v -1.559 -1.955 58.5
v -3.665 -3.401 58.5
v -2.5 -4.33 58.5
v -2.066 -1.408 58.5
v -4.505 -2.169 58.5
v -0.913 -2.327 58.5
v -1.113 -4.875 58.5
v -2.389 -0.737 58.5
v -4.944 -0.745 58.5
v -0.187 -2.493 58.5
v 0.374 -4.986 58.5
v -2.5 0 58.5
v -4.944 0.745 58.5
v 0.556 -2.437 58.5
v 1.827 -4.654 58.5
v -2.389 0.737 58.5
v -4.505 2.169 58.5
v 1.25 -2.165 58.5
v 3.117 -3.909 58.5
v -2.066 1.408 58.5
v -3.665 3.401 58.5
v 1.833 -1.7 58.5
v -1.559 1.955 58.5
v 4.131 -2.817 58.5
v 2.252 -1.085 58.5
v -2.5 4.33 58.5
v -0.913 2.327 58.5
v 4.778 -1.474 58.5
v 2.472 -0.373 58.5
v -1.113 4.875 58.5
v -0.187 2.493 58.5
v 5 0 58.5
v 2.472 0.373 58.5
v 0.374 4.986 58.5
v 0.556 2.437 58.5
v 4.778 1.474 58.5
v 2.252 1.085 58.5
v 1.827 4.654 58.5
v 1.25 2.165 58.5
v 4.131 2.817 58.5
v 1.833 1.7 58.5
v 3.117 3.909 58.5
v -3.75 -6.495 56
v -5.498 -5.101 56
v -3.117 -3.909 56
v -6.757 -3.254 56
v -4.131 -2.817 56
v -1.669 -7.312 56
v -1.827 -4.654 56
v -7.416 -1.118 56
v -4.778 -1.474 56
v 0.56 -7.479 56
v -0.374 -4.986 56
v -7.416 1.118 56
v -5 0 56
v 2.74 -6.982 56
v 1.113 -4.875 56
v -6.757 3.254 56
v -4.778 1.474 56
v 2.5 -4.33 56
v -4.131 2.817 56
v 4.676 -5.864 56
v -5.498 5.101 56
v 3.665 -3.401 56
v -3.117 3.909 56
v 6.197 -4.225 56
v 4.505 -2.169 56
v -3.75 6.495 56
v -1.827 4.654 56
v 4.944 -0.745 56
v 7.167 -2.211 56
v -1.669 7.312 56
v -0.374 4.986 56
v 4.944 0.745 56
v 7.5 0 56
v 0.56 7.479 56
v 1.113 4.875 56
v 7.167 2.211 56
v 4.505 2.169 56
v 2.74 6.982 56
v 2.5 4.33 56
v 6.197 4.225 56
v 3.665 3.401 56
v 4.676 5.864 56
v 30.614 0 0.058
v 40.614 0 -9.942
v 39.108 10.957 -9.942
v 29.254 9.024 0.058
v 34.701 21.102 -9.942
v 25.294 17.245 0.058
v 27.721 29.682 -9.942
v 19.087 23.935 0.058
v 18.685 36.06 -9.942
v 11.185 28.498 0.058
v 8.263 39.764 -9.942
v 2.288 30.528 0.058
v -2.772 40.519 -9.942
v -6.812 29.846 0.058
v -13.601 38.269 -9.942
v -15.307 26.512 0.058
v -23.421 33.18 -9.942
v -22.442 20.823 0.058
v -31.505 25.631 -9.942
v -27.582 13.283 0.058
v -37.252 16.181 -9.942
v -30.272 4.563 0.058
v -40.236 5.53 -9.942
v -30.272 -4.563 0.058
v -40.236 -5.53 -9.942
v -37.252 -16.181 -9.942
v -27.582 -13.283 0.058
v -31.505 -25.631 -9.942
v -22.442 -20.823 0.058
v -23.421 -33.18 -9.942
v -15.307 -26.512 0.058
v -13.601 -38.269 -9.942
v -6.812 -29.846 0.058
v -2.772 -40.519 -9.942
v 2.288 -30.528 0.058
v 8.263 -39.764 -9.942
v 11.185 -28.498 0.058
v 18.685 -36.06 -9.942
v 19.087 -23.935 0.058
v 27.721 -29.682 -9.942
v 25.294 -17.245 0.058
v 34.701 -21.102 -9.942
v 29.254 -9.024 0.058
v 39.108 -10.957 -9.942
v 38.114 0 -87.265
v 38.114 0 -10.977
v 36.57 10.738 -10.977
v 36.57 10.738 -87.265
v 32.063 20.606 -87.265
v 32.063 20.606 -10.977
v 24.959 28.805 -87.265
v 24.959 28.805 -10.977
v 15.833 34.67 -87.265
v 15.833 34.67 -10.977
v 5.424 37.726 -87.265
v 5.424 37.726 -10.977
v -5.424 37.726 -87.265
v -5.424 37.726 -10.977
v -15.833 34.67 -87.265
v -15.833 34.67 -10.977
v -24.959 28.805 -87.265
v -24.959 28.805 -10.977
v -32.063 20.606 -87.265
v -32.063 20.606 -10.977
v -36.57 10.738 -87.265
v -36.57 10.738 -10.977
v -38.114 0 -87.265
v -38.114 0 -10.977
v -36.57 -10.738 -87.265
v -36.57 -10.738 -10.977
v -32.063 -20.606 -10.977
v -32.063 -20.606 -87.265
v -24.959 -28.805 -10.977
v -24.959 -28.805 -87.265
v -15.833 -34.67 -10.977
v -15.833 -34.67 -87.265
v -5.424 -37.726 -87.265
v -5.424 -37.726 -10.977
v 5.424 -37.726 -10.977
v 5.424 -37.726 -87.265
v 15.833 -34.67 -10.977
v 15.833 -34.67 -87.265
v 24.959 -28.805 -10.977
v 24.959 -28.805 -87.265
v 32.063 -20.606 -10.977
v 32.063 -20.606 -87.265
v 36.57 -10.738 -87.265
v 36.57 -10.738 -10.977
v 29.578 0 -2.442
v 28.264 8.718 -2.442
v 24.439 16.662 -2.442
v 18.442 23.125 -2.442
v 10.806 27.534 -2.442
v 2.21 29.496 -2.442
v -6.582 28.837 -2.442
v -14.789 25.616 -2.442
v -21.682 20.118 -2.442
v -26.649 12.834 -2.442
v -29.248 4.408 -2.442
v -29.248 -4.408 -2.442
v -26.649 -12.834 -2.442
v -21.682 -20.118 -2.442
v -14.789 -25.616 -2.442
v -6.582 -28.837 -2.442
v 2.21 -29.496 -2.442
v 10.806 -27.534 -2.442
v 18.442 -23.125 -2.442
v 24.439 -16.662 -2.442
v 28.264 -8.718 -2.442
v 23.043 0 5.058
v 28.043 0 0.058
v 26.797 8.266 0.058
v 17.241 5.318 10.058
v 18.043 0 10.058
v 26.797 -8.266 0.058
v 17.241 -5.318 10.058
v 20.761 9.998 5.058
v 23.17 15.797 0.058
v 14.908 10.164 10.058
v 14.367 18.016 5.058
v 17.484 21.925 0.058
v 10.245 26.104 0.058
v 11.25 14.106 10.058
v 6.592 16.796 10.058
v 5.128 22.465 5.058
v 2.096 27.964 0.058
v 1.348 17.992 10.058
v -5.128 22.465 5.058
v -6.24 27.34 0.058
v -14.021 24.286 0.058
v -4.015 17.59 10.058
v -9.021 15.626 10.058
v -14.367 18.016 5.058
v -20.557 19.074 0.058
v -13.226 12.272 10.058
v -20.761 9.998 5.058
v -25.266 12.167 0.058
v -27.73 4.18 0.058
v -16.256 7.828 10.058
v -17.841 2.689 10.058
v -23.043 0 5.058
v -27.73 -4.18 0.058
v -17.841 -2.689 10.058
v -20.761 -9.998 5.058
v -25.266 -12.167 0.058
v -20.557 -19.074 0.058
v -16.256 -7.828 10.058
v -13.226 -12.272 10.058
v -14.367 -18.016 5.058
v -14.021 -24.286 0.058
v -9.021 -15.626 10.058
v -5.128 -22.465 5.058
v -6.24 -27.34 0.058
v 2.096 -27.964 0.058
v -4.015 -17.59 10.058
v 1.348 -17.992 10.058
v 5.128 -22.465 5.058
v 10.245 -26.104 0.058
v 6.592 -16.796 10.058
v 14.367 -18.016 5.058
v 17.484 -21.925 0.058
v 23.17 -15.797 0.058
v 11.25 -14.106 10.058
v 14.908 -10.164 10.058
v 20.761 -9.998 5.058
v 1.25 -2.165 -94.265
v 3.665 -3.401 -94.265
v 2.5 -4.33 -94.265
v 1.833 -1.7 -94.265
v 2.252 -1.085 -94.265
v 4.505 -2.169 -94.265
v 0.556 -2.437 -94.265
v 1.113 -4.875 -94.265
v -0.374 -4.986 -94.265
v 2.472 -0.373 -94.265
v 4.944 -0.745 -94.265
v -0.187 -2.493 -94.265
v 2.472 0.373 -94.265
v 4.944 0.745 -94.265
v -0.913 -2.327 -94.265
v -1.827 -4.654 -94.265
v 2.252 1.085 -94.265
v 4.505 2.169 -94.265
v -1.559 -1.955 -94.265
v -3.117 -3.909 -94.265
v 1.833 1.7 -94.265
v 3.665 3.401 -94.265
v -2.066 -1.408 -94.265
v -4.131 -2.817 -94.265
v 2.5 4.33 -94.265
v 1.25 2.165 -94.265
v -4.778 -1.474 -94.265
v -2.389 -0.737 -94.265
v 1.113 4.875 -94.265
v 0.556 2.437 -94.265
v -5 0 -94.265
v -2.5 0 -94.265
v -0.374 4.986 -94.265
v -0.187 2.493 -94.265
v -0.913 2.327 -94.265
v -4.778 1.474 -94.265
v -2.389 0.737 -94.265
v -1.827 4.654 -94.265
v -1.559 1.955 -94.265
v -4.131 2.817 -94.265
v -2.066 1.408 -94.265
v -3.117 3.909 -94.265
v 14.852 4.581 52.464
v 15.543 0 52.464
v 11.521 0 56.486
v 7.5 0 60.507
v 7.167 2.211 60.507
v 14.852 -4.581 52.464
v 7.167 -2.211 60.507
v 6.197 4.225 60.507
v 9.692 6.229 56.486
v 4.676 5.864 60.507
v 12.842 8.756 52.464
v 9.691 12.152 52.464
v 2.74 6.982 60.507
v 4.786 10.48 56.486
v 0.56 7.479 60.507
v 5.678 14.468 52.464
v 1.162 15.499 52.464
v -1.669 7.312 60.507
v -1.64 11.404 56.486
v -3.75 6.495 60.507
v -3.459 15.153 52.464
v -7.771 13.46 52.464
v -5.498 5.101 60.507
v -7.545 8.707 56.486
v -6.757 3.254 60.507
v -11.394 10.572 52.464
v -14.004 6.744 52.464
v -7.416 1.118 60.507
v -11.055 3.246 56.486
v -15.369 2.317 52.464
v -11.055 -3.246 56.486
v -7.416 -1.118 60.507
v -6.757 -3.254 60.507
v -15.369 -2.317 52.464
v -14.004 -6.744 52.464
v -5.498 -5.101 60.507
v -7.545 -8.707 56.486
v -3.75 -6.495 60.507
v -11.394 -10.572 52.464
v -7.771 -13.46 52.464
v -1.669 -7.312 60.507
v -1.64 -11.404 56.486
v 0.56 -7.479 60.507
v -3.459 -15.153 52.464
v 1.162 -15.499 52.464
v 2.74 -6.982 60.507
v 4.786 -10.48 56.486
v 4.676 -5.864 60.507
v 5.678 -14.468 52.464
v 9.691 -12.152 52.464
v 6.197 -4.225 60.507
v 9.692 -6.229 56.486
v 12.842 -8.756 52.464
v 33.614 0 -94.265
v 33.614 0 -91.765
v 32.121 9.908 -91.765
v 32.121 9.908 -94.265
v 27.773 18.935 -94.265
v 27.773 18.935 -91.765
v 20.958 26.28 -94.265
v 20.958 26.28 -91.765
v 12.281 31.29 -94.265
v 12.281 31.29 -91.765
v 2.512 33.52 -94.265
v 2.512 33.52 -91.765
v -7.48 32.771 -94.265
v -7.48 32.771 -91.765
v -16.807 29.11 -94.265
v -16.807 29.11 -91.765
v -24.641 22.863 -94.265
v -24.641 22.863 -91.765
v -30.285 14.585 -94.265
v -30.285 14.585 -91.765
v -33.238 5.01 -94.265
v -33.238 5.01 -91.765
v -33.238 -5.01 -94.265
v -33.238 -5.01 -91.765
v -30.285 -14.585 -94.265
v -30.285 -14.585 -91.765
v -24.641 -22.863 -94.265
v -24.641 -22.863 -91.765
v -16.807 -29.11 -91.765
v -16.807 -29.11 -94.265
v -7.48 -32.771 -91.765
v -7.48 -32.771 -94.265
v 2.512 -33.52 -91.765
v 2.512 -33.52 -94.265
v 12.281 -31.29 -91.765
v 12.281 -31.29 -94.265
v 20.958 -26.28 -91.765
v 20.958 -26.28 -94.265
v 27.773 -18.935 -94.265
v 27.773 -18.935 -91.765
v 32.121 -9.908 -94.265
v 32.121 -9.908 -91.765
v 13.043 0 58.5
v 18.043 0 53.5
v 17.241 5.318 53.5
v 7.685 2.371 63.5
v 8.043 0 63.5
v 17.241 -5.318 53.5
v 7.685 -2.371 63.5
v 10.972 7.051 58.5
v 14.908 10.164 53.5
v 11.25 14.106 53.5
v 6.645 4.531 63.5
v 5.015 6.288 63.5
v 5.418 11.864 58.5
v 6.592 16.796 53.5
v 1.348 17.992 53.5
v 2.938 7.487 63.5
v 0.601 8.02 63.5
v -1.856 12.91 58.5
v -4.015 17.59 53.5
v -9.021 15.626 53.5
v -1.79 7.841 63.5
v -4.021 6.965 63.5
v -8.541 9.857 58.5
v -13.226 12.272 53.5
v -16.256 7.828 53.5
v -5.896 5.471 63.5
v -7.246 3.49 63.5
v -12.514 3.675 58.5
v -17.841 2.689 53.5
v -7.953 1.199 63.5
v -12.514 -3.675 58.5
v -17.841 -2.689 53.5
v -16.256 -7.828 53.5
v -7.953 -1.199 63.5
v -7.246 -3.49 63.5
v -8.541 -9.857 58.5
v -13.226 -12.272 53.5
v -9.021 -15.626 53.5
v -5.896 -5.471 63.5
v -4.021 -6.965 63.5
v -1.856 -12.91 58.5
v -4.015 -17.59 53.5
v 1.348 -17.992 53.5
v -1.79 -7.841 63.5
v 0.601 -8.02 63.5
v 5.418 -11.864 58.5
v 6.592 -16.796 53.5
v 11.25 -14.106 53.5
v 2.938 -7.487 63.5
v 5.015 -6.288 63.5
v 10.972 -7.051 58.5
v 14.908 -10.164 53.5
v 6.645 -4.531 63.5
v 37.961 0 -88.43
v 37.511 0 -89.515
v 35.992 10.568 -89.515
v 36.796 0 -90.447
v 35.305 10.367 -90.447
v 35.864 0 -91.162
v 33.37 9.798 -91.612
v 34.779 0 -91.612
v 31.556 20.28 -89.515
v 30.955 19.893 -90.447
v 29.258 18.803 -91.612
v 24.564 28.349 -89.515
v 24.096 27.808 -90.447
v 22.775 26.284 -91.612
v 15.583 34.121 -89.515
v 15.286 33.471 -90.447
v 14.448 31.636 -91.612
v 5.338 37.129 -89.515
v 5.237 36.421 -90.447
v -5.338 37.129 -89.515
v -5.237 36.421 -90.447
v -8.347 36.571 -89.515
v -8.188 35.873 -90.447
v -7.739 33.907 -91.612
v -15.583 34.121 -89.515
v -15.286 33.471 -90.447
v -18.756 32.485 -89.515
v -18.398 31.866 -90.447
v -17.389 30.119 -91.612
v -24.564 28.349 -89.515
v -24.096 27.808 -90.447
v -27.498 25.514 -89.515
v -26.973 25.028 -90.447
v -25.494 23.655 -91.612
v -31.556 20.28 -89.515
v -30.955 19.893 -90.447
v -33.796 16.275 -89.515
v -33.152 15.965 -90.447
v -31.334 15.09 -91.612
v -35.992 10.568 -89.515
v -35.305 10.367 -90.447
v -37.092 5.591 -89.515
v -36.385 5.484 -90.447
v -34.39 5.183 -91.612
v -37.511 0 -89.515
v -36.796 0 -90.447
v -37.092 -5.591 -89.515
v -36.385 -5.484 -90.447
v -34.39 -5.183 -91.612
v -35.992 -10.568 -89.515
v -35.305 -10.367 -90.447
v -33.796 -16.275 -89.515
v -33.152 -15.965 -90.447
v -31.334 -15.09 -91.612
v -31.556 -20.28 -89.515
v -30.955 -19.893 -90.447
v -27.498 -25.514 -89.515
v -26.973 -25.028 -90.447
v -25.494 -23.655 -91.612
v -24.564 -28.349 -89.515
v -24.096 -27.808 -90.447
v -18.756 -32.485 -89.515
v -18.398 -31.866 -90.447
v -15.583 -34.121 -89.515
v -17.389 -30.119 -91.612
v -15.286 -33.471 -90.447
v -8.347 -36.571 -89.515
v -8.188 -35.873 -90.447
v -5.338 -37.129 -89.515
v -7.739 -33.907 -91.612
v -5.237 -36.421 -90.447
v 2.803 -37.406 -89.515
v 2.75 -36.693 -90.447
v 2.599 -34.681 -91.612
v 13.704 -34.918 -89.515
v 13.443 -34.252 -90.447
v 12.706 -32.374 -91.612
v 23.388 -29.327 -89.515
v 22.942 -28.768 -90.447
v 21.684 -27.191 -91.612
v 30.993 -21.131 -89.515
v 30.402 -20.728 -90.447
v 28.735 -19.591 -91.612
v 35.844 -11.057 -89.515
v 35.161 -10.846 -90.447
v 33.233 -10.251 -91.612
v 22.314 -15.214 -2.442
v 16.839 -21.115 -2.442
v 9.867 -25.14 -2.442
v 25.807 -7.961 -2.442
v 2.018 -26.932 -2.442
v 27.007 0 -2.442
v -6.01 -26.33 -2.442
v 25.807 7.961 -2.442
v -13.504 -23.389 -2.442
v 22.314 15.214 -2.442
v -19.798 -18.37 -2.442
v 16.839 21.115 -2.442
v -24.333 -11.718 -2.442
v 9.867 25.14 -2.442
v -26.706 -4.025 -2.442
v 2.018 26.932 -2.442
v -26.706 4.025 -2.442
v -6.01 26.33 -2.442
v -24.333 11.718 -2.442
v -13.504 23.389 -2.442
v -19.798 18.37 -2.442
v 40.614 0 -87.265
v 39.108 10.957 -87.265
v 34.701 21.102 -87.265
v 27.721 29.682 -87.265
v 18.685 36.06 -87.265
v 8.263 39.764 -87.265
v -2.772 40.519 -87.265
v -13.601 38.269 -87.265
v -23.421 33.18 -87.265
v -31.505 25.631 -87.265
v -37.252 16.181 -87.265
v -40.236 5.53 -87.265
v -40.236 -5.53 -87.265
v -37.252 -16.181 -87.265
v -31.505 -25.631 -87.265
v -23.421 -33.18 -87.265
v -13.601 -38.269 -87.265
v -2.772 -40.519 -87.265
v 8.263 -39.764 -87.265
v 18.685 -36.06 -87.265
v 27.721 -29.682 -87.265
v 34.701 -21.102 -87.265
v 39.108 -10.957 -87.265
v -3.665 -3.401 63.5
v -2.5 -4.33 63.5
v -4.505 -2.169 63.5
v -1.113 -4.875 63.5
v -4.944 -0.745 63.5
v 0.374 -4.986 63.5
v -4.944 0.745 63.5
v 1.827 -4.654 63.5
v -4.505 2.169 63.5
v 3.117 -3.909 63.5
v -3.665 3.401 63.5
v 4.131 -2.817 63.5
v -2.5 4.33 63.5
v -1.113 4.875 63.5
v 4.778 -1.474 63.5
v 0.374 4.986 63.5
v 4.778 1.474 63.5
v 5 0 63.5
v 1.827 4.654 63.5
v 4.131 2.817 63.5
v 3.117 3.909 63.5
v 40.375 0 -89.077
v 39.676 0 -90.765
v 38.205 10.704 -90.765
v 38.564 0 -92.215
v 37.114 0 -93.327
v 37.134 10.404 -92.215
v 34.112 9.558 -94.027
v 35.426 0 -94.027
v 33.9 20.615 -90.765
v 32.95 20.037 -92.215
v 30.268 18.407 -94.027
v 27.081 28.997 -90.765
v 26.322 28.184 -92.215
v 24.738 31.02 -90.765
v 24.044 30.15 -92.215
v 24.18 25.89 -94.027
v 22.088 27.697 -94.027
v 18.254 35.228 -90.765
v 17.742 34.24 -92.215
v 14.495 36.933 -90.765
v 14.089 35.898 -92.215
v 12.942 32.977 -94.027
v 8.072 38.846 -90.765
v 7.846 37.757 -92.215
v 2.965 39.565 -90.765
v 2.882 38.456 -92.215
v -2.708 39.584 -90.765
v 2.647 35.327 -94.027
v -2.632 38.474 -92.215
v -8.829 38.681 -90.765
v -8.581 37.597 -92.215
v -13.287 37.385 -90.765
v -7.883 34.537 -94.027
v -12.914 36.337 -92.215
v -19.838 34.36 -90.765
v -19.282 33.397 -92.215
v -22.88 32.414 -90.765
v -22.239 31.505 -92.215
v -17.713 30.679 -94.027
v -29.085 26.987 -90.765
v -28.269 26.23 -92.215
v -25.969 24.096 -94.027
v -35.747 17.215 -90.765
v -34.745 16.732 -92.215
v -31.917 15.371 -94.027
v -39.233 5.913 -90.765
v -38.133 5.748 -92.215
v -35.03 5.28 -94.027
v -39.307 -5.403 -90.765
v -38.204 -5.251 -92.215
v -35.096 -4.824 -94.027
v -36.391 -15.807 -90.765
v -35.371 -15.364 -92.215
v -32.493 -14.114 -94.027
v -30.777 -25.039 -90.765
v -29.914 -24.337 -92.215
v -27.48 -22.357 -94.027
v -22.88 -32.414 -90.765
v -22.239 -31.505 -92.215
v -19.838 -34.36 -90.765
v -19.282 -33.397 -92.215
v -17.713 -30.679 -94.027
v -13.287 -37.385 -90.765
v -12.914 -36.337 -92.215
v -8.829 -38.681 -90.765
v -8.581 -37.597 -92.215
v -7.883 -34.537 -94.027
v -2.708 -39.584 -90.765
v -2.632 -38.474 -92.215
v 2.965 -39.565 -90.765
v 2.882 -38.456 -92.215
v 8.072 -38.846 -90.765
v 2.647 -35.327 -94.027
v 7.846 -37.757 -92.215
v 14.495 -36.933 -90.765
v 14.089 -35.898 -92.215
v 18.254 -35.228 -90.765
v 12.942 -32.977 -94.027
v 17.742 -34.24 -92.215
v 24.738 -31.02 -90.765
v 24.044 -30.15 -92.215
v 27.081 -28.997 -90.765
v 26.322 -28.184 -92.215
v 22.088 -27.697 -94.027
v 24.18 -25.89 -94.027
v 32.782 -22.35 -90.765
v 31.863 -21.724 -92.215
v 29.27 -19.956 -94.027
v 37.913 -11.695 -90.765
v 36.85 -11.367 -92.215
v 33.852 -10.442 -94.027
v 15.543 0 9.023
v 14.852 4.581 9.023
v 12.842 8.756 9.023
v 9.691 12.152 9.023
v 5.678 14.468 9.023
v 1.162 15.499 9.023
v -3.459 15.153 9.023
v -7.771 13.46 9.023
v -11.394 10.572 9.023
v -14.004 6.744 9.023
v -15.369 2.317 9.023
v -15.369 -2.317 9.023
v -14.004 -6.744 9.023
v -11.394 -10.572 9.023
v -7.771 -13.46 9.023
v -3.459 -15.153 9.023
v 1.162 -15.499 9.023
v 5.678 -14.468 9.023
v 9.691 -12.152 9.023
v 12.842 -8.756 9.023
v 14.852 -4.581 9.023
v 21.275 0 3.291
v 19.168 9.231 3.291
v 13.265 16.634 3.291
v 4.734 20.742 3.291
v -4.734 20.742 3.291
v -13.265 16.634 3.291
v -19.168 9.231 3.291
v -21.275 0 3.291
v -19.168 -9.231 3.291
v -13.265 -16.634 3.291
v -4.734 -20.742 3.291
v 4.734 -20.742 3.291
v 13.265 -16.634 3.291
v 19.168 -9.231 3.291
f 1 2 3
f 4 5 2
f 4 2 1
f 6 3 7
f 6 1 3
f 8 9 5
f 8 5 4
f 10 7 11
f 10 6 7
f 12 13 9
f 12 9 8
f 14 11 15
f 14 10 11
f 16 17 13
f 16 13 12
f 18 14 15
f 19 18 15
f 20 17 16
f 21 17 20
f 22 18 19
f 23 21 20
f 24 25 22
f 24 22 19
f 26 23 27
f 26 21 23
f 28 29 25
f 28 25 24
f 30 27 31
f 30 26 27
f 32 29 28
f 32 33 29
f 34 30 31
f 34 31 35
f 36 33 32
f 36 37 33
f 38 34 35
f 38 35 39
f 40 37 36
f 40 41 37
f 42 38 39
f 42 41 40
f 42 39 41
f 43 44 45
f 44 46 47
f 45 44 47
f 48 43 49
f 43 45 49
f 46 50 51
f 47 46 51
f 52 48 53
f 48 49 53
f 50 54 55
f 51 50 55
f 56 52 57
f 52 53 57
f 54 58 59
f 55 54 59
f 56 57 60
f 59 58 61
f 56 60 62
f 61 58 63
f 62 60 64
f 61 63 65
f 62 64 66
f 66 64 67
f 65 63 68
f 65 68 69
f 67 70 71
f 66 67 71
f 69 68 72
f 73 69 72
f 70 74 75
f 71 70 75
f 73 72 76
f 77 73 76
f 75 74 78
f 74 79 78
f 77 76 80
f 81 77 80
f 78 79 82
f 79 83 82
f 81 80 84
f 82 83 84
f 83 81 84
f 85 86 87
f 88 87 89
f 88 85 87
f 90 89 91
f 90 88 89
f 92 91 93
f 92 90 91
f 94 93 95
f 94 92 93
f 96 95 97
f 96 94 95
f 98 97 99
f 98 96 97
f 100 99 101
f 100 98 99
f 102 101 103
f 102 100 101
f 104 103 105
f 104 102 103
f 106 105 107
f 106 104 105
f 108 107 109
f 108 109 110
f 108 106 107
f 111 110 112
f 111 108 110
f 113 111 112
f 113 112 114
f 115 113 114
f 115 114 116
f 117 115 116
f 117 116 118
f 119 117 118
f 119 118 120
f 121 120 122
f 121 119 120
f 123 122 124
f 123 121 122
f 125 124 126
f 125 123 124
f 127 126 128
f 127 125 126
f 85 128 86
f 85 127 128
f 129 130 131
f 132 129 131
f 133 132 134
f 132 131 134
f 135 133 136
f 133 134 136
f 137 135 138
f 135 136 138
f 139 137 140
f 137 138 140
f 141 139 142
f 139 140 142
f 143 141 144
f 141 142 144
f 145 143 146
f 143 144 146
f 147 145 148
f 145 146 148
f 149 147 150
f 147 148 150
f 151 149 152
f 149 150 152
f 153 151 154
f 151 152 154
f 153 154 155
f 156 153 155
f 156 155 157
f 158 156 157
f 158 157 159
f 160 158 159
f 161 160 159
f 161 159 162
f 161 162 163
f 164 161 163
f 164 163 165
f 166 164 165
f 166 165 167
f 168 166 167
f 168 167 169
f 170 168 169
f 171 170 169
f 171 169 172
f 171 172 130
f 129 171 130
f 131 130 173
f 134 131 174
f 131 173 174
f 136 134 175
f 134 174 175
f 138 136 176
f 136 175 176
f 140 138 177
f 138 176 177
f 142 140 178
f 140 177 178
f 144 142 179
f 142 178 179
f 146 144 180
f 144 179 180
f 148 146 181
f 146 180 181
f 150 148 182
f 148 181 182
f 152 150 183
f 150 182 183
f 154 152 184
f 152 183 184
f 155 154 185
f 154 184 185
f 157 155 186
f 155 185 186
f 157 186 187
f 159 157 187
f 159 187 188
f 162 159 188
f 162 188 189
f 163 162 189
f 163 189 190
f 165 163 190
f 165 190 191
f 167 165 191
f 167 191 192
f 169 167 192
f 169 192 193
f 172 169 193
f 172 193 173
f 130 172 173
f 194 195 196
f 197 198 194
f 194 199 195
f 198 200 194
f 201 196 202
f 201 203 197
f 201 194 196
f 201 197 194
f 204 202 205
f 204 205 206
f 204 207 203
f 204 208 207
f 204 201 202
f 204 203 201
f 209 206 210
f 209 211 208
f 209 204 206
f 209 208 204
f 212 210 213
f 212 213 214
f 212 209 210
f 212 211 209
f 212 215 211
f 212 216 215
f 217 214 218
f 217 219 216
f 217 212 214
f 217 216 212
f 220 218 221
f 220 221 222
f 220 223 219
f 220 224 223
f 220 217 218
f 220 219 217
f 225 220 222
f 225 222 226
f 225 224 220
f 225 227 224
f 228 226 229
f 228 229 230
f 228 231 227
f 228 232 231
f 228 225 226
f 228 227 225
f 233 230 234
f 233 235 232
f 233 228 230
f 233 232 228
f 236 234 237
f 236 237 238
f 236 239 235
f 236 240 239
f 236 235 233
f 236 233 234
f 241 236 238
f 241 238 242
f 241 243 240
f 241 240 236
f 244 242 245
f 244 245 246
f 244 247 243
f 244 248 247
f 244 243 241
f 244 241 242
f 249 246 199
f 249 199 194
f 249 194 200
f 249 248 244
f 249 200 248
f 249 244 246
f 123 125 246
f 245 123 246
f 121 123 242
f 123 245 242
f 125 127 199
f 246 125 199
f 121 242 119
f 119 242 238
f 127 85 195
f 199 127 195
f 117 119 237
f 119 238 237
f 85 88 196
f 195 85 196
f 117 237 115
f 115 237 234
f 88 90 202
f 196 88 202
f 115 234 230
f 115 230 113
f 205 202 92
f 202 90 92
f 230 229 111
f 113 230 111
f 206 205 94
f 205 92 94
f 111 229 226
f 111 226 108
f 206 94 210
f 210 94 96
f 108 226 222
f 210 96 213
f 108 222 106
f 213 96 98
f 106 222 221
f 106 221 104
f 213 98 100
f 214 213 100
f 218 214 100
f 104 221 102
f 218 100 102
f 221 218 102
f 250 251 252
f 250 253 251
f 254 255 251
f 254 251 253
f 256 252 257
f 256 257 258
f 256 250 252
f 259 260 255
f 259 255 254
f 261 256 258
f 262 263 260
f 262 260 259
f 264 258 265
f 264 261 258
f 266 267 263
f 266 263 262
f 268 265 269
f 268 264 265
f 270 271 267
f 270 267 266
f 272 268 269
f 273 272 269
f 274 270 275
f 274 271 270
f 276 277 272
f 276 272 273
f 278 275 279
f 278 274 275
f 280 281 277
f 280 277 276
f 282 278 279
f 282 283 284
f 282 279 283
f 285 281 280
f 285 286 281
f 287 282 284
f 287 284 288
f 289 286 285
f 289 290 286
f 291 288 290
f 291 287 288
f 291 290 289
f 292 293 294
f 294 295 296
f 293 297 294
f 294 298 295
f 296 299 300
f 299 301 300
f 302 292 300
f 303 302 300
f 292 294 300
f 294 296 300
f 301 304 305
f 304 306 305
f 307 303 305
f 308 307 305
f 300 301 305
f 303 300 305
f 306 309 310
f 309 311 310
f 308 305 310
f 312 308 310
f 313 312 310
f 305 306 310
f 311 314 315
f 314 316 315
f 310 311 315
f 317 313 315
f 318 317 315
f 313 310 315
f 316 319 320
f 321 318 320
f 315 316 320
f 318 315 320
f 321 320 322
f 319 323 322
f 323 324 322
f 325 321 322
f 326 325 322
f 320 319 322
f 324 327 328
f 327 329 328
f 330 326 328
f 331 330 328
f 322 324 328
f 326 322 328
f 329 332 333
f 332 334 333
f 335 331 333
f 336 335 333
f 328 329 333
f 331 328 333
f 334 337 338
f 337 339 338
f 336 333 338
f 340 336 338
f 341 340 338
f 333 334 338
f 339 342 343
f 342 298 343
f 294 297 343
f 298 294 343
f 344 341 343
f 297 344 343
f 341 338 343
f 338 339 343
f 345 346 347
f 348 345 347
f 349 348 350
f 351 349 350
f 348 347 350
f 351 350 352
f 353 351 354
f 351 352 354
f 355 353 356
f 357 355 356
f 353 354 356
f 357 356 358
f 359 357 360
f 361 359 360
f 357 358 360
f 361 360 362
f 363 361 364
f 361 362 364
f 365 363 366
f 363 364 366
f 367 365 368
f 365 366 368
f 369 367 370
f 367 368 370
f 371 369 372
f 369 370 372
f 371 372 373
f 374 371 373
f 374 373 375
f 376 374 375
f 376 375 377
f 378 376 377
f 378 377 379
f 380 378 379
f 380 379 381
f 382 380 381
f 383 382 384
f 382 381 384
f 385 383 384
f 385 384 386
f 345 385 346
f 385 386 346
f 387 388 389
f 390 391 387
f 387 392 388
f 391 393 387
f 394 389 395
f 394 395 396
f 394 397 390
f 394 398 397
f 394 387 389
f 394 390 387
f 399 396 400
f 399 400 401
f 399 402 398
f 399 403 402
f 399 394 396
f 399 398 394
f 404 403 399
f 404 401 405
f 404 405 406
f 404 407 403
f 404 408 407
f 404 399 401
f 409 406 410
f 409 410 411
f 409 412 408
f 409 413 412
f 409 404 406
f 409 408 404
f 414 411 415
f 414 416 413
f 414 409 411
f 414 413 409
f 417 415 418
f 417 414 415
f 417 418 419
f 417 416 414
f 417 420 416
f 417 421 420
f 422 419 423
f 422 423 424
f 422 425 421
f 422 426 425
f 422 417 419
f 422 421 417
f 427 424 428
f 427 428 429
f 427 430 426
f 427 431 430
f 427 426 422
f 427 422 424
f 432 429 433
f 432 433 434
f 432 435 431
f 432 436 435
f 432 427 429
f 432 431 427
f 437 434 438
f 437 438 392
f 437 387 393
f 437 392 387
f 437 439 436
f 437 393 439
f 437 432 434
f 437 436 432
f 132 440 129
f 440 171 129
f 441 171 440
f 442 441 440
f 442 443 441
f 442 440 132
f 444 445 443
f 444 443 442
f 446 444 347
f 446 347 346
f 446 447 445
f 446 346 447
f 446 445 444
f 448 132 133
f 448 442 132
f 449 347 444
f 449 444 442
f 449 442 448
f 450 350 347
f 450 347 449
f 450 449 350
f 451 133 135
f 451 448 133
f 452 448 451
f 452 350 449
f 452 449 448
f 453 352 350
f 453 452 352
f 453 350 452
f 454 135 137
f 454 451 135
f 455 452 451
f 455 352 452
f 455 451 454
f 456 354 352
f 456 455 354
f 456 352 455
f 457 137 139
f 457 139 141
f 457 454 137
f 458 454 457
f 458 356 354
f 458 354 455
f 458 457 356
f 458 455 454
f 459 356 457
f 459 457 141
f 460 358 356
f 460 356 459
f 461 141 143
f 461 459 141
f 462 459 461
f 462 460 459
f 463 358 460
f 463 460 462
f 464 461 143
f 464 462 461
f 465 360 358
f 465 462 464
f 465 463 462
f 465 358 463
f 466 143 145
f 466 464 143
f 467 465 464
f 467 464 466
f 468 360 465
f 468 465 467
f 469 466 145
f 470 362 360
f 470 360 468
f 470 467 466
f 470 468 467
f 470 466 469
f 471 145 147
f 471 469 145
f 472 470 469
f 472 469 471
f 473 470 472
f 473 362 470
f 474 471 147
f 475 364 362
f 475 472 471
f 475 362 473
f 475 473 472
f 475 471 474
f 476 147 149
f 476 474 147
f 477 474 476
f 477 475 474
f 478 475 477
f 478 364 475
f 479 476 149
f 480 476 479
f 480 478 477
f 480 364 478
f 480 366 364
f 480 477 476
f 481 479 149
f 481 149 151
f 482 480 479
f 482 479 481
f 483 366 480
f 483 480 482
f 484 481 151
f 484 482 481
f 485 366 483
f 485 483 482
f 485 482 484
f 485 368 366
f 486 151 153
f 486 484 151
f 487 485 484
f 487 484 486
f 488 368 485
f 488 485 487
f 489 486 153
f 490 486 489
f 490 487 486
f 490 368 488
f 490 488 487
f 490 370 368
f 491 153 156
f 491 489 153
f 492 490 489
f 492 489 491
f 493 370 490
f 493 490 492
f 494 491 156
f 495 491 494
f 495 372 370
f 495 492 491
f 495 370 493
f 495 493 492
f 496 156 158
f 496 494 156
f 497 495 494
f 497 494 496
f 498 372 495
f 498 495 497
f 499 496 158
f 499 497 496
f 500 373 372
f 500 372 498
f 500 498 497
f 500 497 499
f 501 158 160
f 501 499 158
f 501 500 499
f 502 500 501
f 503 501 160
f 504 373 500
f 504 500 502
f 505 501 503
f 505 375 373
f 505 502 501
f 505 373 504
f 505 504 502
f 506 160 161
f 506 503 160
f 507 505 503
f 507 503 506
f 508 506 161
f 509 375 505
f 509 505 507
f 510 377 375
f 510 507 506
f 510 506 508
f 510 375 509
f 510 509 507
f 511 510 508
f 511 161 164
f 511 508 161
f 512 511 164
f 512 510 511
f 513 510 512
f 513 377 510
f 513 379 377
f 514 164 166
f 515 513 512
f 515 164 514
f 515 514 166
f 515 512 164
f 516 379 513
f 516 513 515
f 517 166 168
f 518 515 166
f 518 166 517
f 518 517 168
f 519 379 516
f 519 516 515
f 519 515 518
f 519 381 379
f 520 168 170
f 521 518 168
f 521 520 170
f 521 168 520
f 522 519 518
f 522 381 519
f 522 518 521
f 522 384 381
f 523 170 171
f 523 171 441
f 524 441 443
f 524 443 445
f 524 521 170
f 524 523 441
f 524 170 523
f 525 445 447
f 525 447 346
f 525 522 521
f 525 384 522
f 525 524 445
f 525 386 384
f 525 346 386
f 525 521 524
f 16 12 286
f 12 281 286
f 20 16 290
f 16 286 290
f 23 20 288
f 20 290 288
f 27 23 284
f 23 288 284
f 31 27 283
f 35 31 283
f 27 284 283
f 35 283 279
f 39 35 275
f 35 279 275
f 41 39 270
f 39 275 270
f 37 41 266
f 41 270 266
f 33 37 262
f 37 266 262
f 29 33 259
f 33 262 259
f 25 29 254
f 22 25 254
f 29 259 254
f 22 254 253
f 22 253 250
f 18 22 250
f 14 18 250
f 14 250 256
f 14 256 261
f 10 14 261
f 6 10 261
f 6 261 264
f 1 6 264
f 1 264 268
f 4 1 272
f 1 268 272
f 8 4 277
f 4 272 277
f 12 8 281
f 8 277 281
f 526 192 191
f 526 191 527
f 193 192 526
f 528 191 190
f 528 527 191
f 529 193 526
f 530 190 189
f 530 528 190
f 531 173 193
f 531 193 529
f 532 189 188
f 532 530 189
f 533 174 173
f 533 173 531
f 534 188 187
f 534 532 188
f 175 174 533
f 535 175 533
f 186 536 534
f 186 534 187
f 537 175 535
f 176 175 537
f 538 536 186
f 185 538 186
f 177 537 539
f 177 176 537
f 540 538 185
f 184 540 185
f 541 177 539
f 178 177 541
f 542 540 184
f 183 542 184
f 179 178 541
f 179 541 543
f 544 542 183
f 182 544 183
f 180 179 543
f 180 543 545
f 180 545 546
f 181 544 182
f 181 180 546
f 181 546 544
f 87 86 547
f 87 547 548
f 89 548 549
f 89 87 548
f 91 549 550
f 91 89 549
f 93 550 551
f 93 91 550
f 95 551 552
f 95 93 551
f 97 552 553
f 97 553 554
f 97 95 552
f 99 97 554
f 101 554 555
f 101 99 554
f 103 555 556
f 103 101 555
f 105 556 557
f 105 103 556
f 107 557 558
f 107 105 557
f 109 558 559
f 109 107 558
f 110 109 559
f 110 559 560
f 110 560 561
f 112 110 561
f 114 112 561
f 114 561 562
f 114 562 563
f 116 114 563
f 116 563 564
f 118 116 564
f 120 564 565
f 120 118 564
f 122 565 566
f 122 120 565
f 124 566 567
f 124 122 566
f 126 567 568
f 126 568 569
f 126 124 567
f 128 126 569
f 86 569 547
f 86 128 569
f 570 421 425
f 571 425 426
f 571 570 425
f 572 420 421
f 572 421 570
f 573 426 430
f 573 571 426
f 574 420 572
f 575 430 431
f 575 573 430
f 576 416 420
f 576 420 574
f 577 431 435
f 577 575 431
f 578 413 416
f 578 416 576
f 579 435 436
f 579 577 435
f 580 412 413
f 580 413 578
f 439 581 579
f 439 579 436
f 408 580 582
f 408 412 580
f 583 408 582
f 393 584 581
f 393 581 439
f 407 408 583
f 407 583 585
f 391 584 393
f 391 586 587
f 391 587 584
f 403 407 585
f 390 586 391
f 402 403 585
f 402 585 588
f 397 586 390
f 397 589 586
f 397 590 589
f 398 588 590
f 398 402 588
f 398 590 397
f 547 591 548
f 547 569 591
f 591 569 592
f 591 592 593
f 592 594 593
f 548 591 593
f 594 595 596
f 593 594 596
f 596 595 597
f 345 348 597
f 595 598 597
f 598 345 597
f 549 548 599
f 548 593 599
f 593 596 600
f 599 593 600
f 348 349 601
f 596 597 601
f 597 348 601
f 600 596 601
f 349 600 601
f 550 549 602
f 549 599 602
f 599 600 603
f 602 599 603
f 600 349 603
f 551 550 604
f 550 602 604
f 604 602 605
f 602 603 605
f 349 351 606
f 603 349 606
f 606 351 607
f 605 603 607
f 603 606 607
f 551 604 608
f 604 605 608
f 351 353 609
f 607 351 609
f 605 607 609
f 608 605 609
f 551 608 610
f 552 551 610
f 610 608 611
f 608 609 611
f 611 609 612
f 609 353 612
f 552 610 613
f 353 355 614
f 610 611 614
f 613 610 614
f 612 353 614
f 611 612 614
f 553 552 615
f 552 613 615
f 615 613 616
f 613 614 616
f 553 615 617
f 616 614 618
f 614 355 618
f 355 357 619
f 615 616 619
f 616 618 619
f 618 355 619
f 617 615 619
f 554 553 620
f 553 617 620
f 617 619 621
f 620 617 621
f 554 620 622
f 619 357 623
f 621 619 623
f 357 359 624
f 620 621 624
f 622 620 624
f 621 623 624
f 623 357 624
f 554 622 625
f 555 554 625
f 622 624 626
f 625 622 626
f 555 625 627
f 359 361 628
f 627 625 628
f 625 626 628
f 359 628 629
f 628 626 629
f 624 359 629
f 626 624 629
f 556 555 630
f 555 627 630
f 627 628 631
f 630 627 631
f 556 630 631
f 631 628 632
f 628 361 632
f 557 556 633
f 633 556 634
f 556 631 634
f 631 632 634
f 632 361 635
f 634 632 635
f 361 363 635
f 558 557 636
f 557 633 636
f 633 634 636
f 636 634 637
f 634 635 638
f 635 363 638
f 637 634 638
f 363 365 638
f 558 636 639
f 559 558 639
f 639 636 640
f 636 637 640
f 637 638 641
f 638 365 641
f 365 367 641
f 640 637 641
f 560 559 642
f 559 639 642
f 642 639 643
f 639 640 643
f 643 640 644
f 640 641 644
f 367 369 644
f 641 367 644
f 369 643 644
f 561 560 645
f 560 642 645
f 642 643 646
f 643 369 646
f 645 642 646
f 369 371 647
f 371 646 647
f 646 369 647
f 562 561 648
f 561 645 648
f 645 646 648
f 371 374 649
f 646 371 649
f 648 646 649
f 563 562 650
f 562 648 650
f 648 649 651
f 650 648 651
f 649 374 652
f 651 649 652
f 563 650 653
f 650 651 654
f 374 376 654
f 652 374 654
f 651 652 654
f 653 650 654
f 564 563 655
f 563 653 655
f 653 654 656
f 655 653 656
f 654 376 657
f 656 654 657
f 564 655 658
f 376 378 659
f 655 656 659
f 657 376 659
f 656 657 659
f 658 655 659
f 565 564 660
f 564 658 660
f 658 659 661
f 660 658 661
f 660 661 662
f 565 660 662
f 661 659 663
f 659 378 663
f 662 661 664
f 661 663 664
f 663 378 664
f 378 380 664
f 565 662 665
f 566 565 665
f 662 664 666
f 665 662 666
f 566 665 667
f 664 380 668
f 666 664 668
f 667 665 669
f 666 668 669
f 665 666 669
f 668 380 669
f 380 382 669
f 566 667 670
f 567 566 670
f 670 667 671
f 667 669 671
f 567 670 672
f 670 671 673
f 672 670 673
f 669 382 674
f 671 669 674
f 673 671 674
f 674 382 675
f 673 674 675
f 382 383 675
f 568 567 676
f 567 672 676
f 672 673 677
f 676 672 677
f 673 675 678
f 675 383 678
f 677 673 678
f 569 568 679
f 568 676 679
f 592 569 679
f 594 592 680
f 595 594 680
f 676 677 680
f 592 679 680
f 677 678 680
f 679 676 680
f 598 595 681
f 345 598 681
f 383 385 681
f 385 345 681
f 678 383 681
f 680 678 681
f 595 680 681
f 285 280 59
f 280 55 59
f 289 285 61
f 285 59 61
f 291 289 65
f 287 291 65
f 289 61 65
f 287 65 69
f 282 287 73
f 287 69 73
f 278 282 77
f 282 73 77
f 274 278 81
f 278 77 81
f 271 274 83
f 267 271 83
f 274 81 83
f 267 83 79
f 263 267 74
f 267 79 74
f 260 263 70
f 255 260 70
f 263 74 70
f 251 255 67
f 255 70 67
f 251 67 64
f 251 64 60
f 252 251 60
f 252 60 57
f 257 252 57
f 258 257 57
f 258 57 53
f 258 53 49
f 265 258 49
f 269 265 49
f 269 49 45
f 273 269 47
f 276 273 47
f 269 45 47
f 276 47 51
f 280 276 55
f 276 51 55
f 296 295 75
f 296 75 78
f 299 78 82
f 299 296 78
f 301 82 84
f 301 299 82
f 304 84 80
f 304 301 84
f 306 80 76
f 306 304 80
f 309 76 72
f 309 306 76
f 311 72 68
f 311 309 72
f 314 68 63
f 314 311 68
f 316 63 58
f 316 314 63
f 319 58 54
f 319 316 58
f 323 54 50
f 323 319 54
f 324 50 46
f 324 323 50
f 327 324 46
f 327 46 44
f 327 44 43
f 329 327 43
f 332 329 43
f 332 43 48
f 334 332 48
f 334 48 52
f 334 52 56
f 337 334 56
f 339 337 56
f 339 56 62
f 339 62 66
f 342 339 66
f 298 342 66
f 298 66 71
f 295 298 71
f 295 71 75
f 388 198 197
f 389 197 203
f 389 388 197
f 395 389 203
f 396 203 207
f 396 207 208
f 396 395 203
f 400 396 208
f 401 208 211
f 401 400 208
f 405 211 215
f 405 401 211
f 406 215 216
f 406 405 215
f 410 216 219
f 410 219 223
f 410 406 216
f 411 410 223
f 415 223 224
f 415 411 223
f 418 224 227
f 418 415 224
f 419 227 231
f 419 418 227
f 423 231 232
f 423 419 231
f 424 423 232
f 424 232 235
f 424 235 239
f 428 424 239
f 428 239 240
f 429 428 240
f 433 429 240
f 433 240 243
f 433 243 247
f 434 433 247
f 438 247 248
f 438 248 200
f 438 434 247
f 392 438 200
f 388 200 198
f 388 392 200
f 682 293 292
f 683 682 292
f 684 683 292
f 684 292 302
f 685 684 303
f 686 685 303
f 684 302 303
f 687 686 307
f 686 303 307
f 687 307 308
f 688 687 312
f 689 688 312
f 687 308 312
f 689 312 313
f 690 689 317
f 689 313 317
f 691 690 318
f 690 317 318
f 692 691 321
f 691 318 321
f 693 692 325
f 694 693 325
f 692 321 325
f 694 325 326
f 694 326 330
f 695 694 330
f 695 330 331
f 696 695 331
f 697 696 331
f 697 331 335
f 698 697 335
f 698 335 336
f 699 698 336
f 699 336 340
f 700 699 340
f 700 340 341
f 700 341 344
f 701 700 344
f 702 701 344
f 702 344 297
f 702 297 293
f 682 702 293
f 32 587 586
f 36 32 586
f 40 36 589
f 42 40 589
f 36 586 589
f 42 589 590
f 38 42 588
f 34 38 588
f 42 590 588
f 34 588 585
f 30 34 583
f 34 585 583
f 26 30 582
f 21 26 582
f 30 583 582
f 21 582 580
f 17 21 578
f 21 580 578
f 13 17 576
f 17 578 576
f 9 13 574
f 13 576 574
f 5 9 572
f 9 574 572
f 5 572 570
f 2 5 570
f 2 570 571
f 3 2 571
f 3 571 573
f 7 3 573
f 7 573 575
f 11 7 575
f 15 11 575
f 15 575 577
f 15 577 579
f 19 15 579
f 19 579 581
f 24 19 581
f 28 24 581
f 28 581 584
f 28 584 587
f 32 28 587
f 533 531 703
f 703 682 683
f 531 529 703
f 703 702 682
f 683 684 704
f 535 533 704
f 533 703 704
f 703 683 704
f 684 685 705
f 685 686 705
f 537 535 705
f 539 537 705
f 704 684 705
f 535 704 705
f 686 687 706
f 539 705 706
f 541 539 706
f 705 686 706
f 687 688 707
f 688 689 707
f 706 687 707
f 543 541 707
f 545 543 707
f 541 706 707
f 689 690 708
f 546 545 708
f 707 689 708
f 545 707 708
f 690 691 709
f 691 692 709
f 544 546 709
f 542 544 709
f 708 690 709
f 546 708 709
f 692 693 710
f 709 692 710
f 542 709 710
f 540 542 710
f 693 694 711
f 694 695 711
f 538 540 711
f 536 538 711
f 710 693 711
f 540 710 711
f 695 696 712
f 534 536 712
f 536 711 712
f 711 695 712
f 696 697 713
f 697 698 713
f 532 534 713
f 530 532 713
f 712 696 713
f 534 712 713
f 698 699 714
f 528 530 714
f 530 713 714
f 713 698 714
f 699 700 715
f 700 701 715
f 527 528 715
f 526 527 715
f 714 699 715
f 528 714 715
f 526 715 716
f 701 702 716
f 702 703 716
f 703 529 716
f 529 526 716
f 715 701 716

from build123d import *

# Parameters (mm, degrees)
F0_R           = 18.0428144426
F1_DEPTH       = 63.5
F2_W           = 40.2940958738
F2_H           = 94.3237841129
F4_SIZE        = 10
F6_D           = 5
F6_CBORE_D     = 10
F6_CBORE_DEPTH = 5
F7_R           = 7
F8_T           = -2.5


# Not quite as in the source:
# - a shell that OpenCascade refuses in one call is made with other operations: the cavity is built on its own and cut out


with BuildPart() as f1:
    # F0 (on Top) → F1 (new body, symmetric)
    with BuildSketch(Plane.XY):
        Circle(F0_R)
    extrude(amount=F1_DEPTH, both=True)

    # F2 (on Front) → F3 (revolve)
    with BuildSketch(Plane.XZ):
        with Locations((20.4668417573, -47.1034049988)):
            Rectangle(F2_W, F2_H)
    revolve(axis=Axis((0, 0, 0), (0, 0, 1)))

    # F4
    f4_edges = [f1.edges().sort_by_distance(p)[0] for p in [
        (-40.61389, 0, 0.058487),
        (-18.042814, 0, 0.058487),
        (18.042814, 0, 31.779244),
        (-18.042814, 0, 63.5),
    ]]
    chamfer(f4_edges, length=F4_SIZE)

    # F6 (through all)
    with Locations(Plane.XY.offset(63.5)):
        with Locations((0, 0)):
            CounterBoreHole(F6_D / 2, F6_CBORE_D / 2, F6_CBORE_DEPTH)

    # F7
    f7_edges = [f1.edges().sort_by_distance(p)[0] for p in [
        (-40.61389, 0, -94.265297),
    ]]
    fillet(f7_edges, radius=F7_R)

    # F8: a shell. OpenCascade refuses it in one call, so the cavity is built on its own and cut out:
    # the body offset inwards by the wall thickness, plus a prism from it out through each open face.
    f8_core = offset(f1.part, amount=F8_T, kind=Kind.INTERSECTION, mode=Mode.PRIVATE)
    f8_exits = [f8_core.faces().sort_by_distance(p)[0] for p in [
        (-5.950744, 0, -91.765297),
    ]]
    add(f8_core, mode=Mode.SUBTRACT)
    extrude(f8_exits, amount=-F8_T, mode=Mode.SUBTRACT)


solid = f1.part
